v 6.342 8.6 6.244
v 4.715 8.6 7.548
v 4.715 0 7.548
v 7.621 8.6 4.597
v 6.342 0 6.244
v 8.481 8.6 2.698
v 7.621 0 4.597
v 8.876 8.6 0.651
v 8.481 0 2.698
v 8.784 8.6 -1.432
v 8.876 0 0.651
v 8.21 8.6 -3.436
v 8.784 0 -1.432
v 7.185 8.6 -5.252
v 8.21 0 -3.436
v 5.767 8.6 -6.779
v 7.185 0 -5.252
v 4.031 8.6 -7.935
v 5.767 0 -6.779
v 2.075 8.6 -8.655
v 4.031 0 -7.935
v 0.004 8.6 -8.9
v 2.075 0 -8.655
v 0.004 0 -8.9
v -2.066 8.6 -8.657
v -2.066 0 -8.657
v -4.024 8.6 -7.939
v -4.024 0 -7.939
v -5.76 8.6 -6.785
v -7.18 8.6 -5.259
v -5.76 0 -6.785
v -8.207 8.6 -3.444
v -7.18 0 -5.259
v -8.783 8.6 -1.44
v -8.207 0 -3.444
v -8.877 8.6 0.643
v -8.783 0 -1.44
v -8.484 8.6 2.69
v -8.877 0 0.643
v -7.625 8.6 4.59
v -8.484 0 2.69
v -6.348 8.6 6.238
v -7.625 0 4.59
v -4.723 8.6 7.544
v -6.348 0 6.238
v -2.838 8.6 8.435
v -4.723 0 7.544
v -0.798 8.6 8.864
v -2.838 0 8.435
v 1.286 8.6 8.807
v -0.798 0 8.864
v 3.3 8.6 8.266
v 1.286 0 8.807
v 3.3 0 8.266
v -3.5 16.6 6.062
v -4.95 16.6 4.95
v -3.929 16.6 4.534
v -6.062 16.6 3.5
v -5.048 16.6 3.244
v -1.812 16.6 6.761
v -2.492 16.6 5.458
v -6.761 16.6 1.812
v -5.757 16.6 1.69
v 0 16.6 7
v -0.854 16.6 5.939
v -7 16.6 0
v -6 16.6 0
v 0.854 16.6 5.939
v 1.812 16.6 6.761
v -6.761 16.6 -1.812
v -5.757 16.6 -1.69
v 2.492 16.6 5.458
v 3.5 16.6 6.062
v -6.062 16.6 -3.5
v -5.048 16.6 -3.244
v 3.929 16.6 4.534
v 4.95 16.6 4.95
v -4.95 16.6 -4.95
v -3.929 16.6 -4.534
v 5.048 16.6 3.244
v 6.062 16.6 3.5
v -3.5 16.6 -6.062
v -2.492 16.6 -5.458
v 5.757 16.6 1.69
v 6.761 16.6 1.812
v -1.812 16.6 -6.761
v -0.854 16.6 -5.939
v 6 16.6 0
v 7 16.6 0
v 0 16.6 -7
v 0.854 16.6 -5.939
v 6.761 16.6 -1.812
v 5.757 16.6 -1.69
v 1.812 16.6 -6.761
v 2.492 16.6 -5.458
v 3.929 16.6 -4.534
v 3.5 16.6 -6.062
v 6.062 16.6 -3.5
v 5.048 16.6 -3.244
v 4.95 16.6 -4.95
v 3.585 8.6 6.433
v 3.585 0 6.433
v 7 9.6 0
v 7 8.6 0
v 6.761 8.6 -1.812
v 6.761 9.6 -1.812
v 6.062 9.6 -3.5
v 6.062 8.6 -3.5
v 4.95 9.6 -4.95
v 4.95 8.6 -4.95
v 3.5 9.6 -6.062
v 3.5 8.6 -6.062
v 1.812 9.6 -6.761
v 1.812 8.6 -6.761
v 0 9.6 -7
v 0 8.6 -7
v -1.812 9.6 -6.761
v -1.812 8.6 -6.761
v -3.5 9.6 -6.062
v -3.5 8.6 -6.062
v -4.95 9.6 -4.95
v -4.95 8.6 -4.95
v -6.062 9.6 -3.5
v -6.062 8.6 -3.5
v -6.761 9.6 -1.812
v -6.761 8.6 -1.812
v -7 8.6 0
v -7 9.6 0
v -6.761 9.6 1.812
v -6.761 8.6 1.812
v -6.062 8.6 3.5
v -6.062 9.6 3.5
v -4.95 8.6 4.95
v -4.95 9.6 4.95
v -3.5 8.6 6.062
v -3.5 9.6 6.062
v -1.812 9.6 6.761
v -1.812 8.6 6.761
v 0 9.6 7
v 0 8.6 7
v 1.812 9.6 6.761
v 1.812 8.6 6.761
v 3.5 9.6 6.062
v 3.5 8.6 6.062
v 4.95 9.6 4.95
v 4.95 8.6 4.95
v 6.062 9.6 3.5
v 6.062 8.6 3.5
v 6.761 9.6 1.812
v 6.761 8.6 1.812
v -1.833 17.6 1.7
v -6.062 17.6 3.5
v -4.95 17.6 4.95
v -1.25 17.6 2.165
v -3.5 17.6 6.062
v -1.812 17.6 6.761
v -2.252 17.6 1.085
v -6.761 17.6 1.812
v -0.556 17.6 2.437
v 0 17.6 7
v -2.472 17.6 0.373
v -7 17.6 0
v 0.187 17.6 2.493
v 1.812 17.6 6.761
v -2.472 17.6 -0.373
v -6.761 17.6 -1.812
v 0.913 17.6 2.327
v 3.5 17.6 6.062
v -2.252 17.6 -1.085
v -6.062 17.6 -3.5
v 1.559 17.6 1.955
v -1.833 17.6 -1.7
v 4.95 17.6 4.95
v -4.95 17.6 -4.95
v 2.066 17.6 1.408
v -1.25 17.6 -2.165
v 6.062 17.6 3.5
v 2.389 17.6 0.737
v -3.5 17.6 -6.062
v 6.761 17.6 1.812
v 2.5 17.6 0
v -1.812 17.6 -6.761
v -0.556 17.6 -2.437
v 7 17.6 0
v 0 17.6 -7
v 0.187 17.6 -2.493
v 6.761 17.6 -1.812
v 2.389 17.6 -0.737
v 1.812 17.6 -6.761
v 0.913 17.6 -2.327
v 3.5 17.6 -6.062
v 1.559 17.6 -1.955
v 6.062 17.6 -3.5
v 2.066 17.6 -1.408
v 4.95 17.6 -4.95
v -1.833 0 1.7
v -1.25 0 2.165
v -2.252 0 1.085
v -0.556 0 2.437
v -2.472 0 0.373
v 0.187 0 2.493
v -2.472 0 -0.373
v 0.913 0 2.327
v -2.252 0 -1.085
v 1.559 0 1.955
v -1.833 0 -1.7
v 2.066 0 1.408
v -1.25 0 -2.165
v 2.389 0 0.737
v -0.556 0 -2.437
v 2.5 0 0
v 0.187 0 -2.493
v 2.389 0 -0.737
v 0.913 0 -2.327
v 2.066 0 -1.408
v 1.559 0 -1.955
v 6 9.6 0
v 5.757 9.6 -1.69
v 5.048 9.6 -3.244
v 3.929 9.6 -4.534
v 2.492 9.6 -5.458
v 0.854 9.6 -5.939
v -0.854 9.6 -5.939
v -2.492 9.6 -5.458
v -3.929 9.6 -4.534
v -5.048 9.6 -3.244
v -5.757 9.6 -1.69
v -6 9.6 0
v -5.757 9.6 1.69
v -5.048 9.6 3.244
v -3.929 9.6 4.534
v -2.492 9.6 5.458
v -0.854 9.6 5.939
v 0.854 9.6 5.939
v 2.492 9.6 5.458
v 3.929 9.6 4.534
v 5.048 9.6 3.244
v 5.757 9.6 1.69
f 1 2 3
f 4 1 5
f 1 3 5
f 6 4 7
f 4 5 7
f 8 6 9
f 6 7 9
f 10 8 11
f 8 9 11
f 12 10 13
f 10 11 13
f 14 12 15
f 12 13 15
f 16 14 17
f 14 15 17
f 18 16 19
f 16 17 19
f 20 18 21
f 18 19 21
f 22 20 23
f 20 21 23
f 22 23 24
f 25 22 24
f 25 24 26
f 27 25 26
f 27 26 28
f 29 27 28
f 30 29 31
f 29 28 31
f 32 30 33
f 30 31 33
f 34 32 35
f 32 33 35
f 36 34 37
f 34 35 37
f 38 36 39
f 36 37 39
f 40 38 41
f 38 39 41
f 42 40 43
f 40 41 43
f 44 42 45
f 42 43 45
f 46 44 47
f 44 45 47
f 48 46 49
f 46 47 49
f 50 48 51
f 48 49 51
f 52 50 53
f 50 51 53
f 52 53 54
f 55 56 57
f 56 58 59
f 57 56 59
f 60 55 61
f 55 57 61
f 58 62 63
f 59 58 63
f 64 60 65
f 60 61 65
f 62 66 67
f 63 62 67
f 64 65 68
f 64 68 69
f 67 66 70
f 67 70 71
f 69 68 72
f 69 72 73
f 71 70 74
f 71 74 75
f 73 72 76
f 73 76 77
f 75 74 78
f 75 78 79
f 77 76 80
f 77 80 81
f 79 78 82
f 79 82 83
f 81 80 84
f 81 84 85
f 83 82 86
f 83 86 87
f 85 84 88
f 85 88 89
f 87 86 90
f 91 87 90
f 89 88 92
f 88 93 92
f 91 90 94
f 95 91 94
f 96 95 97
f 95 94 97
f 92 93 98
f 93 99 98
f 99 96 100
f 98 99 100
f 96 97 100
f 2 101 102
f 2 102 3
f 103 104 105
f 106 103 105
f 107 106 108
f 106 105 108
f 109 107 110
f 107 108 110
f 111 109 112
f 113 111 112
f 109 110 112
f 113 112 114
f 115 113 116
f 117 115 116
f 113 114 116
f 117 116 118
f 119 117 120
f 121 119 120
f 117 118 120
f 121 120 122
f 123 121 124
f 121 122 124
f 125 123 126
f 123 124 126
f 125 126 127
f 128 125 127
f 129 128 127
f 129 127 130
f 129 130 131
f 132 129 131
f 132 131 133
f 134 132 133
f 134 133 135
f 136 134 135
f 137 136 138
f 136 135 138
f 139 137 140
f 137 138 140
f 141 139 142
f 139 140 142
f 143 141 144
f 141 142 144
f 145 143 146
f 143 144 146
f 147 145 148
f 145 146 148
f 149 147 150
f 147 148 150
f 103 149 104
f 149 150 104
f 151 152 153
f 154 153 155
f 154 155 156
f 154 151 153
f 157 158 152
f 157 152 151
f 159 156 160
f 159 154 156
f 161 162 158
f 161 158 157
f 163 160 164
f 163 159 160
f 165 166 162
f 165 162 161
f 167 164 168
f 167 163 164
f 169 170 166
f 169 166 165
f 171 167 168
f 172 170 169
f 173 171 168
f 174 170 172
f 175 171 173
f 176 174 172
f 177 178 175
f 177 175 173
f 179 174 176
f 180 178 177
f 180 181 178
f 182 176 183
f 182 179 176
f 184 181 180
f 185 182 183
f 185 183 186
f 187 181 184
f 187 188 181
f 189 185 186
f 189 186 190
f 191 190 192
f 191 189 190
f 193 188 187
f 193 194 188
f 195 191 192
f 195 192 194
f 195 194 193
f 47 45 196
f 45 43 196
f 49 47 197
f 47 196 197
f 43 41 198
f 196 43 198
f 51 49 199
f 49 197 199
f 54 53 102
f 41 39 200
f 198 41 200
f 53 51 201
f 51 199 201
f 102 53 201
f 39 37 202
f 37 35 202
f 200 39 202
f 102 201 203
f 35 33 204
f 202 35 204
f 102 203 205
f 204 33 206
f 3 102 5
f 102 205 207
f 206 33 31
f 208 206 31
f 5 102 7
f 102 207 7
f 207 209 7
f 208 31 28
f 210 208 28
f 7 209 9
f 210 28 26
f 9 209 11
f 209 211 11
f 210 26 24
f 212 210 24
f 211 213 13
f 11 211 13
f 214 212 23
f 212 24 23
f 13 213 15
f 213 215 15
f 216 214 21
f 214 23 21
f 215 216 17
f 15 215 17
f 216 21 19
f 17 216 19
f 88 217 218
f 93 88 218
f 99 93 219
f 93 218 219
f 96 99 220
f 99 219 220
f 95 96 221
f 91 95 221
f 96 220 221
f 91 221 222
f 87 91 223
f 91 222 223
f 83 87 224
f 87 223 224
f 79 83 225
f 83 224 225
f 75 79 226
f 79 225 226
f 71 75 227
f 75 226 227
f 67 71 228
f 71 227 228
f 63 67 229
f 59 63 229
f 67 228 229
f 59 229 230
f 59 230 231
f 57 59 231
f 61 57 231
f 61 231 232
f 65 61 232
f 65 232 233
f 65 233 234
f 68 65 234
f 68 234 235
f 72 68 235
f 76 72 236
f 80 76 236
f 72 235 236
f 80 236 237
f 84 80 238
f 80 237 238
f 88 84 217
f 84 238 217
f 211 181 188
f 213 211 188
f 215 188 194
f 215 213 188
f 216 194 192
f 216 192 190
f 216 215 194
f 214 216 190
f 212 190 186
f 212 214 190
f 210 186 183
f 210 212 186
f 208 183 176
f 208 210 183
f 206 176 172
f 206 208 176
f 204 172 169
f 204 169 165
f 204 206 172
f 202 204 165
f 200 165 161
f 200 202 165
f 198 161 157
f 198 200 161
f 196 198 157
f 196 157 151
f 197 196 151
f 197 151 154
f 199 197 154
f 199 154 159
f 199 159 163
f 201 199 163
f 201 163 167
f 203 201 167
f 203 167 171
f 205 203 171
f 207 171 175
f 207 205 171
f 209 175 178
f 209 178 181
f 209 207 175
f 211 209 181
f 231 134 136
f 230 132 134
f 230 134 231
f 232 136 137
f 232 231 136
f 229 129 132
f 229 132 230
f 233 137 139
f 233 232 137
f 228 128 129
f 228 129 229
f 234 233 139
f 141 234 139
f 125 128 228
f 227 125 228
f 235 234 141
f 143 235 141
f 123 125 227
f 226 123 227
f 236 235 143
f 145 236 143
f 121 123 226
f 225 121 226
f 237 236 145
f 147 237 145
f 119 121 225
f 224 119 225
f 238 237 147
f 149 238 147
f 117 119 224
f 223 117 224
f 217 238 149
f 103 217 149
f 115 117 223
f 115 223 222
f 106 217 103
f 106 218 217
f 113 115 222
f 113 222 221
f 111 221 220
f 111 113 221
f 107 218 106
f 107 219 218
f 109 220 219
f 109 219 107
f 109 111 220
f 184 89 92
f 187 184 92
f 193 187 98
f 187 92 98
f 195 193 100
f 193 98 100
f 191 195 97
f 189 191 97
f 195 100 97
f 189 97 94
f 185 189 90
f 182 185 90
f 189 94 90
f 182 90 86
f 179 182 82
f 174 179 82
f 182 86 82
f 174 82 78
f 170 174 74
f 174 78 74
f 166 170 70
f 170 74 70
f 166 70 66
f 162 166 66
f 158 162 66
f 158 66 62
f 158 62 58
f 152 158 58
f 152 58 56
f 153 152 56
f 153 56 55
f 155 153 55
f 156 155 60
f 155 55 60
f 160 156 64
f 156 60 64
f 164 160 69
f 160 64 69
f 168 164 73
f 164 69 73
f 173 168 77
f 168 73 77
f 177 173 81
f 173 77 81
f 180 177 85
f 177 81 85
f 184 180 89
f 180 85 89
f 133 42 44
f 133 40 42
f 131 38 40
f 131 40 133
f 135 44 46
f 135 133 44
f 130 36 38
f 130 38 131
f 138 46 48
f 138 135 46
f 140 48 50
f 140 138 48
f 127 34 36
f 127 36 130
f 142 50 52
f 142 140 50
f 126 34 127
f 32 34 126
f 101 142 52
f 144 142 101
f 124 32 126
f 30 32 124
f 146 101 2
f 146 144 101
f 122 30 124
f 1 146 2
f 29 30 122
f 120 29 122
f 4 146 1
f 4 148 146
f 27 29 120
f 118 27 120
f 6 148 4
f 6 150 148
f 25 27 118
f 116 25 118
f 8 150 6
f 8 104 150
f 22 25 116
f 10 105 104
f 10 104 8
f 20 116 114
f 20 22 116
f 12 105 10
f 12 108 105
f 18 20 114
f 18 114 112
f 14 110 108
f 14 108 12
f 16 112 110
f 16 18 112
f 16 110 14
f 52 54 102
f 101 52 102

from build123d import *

# Parameters (mm, degrees)
CROQUIS1_R              = 8.9
CROQUIS1_R_2            = 2.5
SALIENTE_EXTRUIR1_DEPTH = 8.6
CROQUIS2_R              = 7
CROQUIS2_R_2            = 2.5
SALIENTE_EXTRUIR2_DEPTH = 1
CROQUIS3_R              = 6
CROQUIS3_R_2            = 2.5
SALIENTE_EXTRUIR3_DEPTH = 7
CROQUIS4_R              = 7
CROQUIS4_R_2            = 2.5
SALIENTE_EXTRUIR4_DEPTH = 1
CORTAR_EXTRUIR1_DEPTH   = 9.6


with BuildPart() as part:
    # Croquis1 → Saliente-Extruir1 (new body)
    with BuildSketch(Plane(origin=(0, 0, 0), x_dir=(1, 0, 0), z_dir=(0, 1, 0))):
        Circle(CROQUIS1_R)
        Circle(CROQUIS1_R_2, mode=Mode.SUBTRACT)
    extrude(amount=SALIENTE_EXTRUIR1_DEPTH)

    # Croquis2 → Saliente-Extruir2 (add)
    with BuildSketch(Plane(origin=(0, 8.6, 0), x_dir=(1, 0, 0), z_dir=(0, 1, 0))):
        Circle(CROQUIS2_R)
        Circle(CROQUIS2_R_2, mode=Mode.SUBTRACT)
    extrude(amount=SALIENTE_EXTRUIR2_DEPTH)

    # Croquis3 → Saliente-Extruir3 (add)
    with BuildSketch(Plane(origin=(0, 9.6, 0), x_dir=(1, 0, 0), z_dir=(0, 1, 0))):
        Circle(CROQUIS3_R)
        Circle(CROQUIS3_R_2, mode=Mode.SUBTRACT)
    extrude(amount=SALIENTE_EXTRUIR3_DEPTH)

    # Croquis4 → Saliente-Extruir4 (add)
    with BuildSketch(Plane(origin=(0, 16.6, 0), x_dir=(1, 0, 0), z_dir=(0, 1, 0))):
        Circle(CROQUIS4_R)
        Circle(CROQUIS4_R_2, mode=Mode.SUBTRACT)
    extrude(amount=SALIENTE_EXTRUIR4_DEPTH)

    # Croquis7 → Cortar-Extruir1 (cut, through all)
    with BuildSketch(Plane(origin=(0, 8.6, 0), x_dir=(1, 0, 0), z_dir=(0, 1, 0))):
        with BuildLine():
            Line((3.299612335, -8.265746091), (3.585413018, -6.433391848))
            Line((3.585413018, -6.433391848), (4.715491895, -7.548121368))
            ThreePointArc((4.715491895, -7.548121368), (4.023583013, -7.938562826), (3.299612335, -8.265746091))
        make_face()
    extrude(amount=-CORTAR_EXTRUIR1_DEPTH, mode=Mode.SUBTRACT)


solid = part.part
